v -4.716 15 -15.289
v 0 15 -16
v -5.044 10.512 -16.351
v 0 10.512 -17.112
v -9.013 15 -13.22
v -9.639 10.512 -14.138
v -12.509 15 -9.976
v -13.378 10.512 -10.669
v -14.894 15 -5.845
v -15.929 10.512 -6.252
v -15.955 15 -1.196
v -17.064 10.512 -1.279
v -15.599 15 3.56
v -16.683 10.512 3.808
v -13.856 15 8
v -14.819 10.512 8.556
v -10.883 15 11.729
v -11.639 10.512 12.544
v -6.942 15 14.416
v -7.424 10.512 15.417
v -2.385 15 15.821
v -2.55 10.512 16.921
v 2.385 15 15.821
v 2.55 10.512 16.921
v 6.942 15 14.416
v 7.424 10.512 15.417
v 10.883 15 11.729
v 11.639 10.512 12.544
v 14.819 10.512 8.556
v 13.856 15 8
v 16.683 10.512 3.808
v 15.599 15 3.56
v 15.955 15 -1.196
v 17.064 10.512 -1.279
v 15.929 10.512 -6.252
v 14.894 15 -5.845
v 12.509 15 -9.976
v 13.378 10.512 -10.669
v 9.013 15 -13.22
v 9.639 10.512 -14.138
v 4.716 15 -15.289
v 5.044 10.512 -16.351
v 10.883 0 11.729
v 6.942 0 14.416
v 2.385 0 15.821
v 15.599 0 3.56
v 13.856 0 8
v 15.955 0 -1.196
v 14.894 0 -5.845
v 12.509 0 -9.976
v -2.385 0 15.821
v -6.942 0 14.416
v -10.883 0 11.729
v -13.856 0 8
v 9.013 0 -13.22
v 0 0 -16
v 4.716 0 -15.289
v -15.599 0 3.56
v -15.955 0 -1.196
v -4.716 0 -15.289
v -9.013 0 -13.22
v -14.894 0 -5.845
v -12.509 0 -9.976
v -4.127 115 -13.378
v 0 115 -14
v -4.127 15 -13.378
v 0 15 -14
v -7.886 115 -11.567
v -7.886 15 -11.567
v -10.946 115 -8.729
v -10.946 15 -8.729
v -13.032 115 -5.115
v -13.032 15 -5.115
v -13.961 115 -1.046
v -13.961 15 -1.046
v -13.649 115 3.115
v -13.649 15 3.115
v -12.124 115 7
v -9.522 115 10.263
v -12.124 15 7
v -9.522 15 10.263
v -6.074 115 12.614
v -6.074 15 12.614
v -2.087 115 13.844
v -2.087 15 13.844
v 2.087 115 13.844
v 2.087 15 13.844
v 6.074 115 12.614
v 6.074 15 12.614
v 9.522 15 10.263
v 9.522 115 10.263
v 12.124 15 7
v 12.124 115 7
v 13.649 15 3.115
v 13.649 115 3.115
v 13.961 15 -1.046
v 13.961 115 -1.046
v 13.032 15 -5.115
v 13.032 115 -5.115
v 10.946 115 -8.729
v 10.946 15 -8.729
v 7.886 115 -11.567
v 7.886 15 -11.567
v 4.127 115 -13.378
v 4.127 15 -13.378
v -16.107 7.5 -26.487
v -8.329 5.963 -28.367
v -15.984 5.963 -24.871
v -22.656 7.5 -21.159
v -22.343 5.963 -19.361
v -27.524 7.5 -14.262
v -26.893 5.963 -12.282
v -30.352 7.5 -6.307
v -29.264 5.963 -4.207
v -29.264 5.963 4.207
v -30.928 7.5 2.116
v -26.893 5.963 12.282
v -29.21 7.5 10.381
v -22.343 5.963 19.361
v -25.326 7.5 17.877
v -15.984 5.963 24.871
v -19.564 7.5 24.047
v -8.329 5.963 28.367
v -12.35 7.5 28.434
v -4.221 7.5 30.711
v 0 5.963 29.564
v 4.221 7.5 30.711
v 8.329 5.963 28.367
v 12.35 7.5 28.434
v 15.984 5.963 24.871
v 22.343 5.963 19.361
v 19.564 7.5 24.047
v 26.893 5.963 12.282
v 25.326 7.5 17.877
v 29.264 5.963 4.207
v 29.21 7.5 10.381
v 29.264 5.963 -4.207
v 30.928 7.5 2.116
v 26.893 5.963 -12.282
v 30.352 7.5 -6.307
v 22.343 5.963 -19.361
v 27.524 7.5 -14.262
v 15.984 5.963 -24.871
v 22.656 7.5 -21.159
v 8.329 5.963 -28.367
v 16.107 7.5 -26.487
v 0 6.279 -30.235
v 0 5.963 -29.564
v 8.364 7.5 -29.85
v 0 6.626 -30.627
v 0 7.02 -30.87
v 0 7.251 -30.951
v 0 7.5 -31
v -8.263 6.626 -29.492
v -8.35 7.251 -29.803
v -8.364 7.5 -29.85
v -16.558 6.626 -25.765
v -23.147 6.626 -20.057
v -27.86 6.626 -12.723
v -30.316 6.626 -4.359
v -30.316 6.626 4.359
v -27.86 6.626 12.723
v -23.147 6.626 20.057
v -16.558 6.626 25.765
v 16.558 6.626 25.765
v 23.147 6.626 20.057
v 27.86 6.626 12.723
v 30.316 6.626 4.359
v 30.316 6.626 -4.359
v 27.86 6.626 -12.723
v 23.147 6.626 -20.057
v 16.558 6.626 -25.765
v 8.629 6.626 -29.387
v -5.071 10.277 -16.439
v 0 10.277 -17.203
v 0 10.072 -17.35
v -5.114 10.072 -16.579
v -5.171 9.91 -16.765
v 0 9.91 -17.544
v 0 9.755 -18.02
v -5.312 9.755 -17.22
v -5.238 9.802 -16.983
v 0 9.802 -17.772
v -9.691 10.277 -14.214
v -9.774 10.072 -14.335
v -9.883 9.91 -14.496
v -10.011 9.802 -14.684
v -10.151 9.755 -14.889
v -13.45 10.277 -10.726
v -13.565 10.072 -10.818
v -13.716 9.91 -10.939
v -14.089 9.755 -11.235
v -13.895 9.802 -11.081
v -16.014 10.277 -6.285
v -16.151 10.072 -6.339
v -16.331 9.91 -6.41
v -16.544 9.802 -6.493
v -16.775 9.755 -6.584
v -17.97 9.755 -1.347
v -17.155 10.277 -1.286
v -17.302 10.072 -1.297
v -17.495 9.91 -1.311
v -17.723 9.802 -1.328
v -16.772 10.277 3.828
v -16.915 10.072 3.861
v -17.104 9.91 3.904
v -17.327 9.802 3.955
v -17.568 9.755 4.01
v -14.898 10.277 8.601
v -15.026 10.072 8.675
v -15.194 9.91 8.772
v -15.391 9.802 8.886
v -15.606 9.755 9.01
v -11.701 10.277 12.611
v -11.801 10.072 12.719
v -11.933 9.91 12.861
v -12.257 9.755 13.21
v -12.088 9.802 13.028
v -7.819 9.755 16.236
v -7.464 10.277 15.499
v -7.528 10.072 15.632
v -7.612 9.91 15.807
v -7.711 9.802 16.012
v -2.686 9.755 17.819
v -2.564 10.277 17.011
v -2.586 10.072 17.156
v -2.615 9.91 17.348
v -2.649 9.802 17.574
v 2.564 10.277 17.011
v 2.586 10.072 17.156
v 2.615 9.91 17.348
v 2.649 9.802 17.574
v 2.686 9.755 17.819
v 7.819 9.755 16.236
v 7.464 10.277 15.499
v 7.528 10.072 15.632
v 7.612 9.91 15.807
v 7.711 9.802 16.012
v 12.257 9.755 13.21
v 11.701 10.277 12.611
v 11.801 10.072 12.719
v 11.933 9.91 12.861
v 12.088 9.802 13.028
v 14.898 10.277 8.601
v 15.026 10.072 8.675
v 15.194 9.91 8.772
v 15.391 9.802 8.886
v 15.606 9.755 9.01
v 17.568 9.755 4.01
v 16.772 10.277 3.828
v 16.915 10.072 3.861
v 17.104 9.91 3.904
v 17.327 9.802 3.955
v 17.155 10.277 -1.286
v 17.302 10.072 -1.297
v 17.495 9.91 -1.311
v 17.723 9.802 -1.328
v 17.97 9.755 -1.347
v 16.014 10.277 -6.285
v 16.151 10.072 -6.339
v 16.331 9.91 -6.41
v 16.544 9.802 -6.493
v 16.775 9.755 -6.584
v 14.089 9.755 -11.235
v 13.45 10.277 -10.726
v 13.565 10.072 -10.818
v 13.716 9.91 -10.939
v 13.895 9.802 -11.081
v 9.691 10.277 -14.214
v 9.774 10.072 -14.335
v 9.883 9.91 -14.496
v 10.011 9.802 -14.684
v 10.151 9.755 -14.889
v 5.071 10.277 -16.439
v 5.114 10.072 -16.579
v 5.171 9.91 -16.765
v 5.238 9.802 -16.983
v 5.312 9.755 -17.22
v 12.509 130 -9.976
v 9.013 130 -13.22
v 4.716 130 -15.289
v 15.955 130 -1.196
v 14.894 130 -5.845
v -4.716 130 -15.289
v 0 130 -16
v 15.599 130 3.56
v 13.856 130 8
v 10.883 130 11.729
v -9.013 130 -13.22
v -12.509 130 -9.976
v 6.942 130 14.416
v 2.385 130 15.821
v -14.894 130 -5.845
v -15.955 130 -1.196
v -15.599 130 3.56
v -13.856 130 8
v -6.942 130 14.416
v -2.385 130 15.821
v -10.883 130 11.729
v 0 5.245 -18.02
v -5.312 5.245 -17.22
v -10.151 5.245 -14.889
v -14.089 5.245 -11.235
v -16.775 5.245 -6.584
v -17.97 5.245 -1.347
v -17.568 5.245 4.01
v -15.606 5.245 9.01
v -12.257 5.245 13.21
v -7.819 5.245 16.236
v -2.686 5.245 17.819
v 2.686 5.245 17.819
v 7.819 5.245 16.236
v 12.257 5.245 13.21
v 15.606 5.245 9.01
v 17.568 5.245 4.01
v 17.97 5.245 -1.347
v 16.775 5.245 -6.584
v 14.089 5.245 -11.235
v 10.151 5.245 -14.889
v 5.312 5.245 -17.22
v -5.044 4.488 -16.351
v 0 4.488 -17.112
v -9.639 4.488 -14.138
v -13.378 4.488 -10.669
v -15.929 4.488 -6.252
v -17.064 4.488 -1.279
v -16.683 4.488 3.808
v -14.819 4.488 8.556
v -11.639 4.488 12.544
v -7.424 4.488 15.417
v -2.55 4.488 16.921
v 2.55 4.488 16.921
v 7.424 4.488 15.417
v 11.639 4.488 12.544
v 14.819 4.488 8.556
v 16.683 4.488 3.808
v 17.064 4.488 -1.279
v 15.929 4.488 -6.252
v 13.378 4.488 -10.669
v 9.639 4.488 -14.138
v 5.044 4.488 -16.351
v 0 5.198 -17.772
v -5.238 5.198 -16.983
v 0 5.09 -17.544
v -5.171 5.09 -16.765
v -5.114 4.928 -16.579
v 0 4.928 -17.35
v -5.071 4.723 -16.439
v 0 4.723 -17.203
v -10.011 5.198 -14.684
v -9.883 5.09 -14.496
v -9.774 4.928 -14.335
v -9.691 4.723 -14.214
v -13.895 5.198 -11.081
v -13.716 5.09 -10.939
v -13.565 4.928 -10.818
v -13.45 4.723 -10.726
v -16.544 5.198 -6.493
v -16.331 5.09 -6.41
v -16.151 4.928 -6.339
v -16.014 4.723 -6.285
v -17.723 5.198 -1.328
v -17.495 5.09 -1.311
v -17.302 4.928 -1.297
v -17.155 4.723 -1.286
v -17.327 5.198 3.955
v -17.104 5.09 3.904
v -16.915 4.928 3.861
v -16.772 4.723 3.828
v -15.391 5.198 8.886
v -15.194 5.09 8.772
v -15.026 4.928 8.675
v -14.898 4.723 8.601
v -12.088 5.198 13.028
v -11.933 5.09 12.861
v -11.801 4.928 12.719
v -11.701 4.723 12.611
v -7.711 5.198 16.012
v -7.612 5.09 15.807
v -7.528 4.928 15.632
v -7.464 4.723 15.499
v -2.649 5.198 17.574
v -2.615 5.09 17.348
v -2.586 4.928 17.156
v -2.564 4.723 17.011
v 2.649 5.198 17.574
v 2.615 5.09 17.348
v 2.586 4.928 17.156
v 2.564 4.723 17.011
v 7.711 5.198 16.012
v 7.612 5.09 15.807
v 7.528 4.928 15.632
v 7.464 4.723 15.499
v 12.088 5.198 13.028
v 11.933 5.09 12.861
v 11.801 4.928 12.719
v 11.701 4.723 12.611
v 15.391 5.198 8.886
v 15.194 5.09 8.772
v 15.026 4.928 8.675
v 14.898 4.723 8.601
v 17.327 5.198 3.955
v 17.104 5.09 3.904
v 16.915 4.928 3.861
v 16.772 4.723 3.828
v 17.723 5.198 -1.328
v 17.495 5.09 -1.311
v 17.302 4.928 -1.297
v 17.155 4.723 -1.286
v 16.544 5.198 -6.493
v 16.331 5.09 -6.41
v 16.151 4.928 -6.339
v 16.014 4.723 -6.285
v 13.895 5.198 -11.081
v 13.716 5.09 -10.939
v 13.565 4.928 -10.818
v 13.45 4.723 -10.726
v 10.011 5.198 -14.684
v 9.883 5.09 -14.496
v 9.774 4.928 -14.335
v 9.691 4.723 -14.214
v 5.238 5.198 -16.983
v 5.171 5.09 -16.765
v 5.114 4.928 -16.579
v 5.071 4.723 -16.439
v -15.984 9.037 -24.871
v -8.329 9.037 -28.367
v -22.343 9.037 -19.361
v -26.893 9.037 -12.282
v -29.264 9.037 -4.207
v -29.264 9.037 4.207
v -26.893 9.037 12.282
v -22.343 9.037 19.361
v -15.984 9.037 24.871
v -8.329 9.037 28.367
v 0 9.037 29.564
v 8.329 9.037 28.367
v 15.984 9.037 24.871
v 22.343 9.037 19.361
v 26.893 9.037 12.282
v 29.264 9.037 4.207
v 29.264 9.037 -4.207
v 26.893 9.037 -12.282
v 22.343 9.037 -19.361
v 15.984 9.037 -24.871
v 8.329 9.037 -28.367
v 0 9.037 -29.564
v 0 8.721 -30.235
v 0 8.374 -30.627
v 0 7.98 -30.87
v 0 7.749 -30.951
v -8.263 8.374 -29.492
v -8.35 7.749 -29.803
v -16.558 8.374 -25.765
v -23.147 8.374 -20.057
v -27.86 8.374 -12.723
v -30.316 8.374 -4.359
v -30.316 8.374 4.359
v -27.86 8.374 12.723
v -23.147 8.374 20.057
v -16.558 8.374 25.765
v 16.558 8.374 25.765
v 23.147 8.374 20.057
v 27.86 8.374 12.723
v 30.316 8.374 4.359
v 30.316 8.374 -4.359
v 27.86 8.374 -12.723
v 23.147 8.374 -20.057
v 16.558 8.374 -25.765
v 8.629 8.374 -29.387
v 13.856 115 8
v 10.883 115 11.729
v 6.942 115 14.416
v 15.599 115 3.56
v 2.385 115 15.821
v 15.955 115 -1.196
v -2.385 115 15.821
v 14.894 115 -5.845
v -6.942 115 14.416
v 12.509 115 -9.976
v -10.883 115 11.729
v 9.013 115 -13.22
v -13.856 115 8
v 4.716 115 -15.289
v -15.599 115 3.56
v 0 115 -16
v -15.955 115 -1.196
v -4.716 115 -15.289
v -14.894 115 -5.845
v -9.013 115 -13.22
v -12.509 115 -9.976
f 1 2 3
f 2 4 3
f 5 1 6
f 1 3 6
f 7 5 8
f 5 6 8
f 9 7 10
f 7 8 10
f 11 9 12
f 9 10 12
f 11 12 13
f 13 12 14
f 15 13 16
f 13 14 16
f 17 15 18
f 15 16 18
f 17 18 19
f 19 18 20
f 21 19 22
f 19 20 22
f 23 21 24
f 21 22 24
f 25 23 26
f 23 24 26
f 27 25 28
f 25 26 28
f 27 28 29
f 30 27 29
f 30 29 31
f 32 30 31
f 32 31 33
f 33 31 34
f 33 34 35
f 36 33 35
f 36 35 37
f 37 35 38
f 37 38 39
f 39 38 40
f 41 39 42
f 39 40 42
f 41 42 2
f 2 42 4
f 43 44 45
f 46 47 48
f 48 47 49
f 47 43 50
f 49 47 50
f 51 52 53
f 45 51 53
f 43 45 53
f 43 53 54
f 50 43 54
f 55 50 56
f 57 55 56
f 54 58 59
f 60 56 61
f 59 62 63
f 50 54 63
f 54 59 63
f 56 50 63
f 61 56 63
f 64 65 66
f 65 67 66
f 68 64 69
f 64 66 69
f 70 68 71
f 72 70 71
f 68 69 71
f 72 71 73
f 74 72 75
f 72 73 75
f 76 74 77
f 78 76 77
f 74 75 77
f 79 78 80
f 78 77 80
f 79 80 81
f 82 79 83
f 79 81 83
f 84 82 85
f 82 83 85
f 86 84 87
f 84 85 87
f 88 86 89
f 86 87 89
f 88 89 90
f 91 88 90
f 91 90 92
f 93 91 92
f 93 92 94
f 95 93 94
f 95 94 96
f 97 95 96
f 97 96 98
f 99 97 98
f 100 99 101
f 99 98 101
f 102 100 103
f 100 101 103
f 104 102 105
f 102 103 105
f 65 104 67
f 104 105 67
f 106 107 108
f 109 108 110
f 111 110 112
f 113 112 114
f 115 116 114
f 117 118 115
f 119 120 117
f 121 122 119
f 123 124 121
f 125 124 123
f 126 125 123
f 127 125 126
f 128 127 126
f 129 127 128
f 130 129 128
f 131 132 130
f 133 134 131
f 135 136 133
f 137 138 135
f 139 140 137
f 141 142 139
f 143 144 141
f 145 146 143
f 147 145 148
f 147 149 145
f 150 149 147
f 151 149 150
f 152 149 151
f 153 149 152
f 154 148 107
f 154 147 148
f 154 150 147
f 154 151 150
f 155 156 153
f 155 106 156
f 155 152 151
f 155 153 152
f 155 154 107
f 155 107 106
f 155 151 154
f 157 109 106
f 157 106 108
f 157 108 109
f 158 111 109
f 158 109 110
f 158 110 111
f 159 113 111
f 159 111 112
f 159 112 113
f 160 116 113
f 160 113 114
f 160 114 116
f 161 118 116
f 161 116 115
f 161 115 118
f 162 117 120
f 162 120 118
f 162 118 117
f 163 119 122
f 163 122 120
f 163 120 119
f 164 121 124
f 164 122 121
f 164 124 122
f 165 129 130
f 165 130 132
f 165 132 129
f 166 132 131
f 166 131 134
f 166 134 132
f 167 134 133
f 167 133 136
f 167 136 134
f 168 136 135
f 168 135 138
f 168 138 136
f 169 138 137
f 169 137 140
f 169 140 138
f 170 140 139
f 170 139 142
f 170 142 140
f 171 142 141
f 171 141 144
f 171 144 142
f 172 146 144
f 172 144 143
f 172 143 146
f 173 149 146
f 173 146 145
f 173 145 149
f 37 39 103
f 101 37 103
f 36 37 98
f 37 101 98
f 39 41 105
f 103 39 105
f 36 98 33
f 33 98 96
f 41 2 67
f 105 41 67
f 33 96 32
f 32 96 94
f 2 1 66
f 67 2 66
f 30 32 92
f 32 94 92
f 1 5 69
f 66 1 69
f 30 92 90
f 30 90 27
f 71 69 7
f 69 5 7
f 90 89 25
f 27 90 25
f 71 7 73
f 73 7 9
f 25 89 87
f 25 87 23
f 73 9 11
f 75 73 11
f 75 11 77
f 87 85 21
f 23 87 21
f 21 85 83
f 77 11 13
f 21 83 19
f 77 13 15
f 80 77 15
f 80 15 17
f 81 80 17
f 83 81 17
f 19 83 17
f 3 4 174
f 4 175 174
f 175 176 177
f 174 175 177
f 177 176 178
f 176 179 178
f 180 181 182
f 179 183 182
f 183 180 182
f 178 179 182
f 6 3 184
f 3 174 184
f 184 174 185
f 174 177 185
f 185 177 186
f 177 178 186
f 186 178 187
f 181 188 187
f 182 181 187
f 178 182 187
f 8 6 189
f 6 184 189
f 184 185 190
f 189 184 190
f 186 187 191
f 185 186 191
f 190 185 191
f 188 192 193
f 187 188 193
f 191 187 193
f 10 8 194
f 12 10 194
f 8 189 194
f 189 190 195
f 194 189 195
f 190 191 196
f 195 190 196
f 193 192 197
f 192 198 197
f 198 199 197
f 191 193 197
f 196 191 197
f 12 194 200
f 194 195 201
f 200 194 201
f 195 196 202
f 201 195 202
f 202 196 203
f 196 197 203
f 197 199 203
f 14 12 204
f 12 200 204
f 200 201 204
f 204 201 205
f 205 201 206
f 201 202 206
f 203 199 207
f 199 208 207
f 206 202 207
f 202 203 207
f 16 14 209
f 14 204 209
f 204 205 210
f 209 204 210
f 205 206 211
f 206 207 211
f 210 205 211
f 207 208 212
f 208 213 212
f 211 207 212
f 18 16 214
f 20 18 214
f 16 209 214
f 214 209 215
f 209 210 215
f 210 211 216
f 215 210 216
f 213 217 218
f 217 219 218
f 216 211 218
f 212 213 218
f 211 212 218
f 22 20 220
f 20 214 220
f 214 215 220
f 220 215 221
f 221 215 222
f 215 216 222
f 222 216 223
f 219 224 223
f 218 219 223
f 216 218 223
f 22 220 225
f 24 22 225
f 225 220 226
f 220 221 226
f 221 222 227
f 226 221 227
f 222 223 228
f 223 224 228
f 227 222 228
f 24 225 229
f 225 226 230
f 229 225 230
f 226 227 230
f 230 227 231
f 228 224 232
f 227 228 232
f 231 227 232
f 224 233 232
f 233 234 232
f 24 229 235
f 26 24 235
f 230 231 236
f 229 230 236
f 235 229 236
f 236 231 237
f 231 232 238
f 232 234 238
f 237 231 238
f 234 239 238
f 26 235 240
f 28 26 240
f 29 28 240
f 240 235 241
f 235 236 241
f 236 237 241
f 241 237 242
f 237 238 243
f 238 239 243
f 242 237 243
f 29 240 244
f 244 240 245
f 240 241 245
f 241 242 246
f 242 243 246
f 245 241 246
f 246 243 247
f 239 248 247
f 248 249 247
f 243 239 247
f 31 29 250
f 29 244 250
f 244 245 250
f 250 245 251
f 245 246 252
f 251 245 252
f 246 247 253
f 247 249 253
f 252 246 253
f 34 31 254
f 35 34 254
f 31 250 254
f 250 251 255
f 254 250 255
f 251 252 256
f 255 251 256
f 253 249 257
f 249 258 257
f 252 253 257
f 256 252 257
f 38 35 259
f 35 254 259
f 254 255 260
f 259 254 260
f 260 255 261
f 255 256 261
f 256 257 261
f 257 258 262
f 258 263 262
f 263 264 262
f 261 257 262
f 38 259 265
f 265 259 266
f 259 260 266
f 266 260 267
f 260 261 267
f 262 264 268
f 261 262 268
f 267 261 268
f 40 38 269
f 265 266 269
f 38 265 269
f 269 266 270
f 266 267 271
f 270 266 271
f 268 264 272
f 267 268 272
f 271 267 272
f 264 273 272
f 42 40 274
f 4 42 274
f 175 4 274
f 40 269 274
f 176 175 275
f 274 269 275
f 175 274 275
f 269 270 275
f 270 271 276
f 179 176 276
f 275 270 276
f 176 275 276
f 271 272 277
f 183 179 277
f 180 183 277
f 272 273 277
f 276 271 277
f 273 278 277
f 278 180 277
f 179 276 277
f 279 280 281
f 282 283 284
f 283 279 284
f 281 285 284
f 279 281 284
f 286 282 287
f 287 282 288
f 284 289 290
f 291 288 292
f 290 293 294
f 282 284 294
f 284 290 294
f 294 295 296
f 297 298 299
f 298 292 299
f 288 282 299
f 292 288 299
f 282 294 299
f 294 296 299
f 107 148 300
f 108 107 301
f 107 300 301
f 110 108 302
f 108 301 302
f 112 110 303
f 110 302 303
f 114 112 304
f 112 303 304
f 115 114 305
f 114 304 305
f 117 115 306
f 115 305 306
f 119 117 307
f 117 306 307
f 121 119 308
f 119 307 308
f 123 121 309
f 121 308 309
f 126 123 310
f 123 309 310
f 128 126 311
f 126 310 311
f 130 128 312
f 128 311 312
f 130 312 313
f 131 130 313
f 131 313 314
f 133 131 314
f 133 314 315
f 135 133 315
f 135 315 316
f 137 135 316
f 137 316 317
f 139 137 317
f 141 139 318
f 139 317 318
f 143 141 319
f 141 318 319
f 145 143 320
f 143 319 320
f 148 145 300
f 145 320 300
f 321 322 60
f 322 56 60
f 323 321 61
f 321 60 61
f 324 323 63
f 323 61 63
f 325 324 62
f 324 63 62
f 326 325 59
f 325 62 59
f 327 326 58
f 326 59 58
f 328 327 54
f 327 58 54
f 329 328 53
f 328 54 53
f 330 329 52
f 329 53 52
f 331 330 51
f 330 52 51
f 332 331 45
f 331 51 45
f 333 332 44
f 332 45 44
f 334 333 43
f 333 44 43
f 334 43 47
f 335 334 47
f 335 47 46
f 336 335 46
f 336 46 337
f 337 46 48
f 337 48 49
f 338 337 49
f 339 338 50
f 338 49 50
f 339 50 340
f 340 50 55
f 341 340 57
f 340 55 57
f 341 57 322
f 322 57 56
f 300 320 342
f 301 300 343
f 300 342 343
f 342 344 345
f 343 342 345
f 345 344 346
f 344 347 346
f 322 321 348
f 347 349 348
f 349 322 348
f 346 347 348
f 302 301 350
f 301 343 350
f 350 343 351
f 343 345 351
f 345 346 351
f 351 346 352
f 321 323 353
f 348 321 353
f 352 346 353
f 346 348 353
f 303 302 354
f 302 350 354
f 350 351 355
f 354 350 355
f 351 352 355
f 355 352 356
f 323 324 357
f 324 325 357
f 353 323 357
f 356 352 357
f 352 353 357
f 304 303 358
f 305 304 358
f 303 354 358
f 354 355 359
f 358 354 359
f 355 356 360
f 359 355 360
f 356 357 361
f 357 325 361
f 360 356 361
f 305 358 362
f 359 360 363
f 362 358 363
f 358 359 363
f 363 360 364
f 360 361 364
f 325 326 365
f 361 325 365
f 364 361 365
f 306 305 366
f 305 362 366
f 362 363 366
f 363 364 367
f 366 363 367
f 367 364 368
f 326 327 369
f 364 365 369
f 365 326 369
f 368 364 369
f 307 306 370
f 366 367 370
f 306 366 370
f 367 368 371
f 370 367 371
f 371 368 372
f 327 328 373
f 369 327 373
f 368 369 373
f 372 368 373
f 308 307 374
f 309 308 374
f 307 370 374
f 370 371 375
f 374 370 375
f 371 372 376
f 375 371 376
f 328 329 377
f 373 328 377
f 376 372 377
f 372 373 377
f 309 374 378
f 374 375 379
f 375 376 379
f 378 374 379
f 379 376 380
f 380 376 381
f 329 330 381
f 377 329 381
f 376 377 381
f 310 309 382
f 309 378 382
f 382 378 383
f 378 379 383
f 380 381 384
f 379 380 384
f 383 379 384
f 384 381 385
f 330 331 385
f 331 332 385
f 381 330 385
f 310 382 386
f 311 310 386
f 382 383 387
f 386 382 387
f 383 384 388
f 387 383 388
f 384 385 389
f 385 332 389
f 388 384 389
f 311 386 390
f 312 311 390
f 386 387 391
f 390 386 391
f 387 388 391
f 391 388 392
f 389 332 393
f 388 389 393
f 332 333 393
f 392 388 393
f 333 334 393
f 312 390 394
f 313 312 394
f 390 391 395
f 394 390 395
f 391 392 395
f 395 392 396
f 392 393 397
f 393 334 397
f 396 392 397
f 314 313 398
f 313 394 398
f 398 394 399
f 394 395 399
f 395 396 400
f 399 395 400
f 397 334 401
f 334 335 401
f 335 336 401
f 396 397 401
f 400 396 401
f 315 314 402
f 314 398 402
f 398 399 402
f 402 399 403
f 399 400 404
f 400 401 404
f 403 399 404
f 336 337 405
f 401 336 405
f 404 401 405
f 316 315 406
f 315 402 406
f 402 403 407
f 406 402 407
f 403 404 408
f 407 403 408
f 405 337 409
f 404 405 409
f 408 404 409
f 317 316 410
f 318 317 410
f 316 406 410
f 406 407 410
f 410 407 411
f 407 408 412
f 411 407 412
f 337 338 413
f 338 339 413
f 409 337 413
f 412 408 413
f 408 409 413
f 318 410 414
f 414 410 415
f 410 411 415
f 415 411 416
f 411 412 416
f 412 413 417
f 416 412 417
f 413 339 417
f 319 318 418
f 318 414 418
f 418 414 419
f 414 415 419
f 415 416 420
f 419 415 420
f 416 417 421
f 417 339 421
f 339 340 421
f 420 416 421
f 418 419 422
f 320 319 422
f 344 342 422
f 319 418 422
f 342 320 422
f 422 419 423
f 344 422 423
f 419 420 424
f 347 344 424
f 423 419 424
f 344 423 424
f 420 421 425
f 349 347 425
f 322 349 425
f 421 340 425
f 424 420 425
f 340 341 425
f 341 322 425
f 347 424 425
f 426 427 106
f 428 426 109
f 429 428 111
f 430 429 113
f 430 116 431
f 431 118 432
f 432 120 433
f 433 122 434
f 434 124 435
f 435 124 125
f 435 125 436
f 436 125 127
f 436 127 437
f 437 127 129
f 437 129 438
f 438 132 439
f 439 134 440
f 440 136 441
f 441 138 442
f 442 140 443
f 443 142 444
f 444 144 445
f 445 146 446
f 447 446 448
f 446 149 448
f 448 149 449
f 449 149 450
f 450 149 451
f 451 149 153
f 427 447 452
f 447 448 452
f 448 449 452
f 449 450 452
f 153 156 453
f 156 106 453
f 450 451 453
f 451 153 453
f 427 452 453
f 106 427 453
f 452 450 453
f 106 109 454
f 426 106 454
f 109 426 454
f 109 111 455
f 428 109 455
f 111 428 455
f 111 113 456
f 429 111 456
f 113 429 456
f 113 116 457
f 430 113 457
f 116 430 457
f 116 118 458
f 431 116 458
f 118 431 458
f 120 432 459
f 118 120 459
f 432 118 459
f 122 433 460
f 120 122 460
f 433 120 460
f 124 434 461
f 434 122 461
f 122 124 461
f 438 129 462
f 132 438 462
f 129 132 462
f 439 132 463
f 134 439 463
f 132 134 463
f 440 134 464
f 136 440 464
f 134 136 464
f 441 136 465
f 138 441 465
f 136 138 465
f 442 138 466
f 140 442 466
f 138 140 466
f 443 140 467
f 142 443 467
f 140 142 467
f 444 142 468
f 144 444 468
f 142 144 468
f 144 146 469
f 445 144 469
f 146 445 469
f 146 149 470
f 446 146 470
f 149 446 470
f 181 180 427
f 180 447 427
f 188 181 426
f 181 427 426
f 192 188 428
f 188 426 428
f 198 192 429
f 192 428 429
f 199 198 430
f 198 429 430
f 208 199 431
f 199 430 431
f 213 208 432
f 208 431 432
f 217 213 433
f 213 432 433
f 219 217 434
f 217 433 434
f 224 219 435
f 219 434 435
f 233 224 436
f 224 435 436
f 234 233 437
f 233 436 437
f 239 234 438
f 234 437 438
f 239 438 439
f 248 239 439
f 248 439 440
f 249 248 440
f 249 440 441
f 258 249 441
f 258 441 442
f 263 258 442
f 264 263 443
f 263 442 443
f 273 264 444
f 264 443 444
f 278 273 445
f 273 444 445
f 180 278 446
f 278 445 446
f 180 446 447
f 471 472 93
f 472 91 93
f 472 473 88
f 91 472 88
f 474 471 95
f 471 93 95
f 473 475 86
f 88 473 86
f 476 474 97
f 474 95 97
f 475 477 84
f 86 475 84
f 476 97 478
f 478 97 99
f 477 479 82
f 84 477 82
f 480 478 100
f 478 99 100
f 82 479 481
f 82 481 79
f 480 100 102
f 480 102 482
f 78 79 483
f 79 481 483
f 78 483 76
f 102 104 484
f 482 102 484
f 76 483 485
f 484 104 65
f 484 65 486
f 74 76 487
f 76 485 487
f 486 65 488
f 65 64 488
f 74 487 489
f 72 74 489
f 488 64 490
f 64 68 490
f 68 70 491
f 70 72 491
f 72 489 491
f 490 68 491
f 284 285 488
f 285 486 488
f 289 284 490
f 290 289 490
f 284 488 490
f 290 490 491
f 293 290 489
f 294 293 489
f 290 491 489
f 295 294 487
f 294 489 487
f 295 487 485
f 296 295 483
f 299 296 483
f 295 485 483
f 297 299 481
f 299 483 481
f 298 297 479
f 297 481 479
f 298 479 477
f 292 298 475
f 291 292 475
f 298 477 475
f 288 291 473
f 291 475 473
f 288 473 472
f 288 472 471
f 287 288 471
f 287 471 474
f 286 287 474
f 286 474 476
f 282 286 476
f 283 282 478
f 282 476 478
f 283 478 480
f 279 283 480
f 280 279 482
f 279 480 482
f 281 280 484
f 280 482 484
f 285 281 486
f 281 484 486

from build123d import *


with BuildPart() as part:
    # Sketch1 → Revolve1 (revolve)
    with BuildSketch(Plane.XY, mode=Mode.PRIVATE) as revolve1_sk:
        with BuildLine():
            Line((0, 0), (0, 130))
            Line((0, 130), (16, 130))
            Line((16, 130), (16, 115))
            Line((16, 115), (14, 115))
            Line((14, 115), (14, 15))
            Line((14, 15), (16, 15))
            Line((16, 15), (17.111692668, 10.512431094))
            ThreePointArc((17.111692668, 10.512431094), (17.441933325, 9.984863822), (18.020263304, 9.754819144))
            Line((18.020263304, 9.754819144), (29.564485303, 9.036667386))
            add(Edge.make_bspline(
                [(29.564485303, 9.036667386), (30.853089791, 8.614064405), (31, 7.5)],
                knots=[0, 0, 0, 1, 1, 1], degree=2))
            add(Edge.make_bspline(
                [(29.564485303, 5.963332614), (30.853089791, 6.385935595), (31, 7.5)],
                knots=[0, 0, 0, 1, 1, 1], degree=2))
            Line((29.564485303, 5.963332614), (18.020263304, 5.245180856))
            ThreePointArc((18.020263304, 5.245180856), (17.441933325, 5.015136178), (17.111692668, 4.487568906))
            Line((17.111692668, 4.487568906), (16, 0))
            Line((16, 0), (0, 0))
        make_face()
    revolve(revolve1_sk.sketch.rotate(Axis((0, 0, 0), (0, 1, 0)), 90), axis=Axis((0, 0, 0), (0, 1, 0)))


solid = part.part
